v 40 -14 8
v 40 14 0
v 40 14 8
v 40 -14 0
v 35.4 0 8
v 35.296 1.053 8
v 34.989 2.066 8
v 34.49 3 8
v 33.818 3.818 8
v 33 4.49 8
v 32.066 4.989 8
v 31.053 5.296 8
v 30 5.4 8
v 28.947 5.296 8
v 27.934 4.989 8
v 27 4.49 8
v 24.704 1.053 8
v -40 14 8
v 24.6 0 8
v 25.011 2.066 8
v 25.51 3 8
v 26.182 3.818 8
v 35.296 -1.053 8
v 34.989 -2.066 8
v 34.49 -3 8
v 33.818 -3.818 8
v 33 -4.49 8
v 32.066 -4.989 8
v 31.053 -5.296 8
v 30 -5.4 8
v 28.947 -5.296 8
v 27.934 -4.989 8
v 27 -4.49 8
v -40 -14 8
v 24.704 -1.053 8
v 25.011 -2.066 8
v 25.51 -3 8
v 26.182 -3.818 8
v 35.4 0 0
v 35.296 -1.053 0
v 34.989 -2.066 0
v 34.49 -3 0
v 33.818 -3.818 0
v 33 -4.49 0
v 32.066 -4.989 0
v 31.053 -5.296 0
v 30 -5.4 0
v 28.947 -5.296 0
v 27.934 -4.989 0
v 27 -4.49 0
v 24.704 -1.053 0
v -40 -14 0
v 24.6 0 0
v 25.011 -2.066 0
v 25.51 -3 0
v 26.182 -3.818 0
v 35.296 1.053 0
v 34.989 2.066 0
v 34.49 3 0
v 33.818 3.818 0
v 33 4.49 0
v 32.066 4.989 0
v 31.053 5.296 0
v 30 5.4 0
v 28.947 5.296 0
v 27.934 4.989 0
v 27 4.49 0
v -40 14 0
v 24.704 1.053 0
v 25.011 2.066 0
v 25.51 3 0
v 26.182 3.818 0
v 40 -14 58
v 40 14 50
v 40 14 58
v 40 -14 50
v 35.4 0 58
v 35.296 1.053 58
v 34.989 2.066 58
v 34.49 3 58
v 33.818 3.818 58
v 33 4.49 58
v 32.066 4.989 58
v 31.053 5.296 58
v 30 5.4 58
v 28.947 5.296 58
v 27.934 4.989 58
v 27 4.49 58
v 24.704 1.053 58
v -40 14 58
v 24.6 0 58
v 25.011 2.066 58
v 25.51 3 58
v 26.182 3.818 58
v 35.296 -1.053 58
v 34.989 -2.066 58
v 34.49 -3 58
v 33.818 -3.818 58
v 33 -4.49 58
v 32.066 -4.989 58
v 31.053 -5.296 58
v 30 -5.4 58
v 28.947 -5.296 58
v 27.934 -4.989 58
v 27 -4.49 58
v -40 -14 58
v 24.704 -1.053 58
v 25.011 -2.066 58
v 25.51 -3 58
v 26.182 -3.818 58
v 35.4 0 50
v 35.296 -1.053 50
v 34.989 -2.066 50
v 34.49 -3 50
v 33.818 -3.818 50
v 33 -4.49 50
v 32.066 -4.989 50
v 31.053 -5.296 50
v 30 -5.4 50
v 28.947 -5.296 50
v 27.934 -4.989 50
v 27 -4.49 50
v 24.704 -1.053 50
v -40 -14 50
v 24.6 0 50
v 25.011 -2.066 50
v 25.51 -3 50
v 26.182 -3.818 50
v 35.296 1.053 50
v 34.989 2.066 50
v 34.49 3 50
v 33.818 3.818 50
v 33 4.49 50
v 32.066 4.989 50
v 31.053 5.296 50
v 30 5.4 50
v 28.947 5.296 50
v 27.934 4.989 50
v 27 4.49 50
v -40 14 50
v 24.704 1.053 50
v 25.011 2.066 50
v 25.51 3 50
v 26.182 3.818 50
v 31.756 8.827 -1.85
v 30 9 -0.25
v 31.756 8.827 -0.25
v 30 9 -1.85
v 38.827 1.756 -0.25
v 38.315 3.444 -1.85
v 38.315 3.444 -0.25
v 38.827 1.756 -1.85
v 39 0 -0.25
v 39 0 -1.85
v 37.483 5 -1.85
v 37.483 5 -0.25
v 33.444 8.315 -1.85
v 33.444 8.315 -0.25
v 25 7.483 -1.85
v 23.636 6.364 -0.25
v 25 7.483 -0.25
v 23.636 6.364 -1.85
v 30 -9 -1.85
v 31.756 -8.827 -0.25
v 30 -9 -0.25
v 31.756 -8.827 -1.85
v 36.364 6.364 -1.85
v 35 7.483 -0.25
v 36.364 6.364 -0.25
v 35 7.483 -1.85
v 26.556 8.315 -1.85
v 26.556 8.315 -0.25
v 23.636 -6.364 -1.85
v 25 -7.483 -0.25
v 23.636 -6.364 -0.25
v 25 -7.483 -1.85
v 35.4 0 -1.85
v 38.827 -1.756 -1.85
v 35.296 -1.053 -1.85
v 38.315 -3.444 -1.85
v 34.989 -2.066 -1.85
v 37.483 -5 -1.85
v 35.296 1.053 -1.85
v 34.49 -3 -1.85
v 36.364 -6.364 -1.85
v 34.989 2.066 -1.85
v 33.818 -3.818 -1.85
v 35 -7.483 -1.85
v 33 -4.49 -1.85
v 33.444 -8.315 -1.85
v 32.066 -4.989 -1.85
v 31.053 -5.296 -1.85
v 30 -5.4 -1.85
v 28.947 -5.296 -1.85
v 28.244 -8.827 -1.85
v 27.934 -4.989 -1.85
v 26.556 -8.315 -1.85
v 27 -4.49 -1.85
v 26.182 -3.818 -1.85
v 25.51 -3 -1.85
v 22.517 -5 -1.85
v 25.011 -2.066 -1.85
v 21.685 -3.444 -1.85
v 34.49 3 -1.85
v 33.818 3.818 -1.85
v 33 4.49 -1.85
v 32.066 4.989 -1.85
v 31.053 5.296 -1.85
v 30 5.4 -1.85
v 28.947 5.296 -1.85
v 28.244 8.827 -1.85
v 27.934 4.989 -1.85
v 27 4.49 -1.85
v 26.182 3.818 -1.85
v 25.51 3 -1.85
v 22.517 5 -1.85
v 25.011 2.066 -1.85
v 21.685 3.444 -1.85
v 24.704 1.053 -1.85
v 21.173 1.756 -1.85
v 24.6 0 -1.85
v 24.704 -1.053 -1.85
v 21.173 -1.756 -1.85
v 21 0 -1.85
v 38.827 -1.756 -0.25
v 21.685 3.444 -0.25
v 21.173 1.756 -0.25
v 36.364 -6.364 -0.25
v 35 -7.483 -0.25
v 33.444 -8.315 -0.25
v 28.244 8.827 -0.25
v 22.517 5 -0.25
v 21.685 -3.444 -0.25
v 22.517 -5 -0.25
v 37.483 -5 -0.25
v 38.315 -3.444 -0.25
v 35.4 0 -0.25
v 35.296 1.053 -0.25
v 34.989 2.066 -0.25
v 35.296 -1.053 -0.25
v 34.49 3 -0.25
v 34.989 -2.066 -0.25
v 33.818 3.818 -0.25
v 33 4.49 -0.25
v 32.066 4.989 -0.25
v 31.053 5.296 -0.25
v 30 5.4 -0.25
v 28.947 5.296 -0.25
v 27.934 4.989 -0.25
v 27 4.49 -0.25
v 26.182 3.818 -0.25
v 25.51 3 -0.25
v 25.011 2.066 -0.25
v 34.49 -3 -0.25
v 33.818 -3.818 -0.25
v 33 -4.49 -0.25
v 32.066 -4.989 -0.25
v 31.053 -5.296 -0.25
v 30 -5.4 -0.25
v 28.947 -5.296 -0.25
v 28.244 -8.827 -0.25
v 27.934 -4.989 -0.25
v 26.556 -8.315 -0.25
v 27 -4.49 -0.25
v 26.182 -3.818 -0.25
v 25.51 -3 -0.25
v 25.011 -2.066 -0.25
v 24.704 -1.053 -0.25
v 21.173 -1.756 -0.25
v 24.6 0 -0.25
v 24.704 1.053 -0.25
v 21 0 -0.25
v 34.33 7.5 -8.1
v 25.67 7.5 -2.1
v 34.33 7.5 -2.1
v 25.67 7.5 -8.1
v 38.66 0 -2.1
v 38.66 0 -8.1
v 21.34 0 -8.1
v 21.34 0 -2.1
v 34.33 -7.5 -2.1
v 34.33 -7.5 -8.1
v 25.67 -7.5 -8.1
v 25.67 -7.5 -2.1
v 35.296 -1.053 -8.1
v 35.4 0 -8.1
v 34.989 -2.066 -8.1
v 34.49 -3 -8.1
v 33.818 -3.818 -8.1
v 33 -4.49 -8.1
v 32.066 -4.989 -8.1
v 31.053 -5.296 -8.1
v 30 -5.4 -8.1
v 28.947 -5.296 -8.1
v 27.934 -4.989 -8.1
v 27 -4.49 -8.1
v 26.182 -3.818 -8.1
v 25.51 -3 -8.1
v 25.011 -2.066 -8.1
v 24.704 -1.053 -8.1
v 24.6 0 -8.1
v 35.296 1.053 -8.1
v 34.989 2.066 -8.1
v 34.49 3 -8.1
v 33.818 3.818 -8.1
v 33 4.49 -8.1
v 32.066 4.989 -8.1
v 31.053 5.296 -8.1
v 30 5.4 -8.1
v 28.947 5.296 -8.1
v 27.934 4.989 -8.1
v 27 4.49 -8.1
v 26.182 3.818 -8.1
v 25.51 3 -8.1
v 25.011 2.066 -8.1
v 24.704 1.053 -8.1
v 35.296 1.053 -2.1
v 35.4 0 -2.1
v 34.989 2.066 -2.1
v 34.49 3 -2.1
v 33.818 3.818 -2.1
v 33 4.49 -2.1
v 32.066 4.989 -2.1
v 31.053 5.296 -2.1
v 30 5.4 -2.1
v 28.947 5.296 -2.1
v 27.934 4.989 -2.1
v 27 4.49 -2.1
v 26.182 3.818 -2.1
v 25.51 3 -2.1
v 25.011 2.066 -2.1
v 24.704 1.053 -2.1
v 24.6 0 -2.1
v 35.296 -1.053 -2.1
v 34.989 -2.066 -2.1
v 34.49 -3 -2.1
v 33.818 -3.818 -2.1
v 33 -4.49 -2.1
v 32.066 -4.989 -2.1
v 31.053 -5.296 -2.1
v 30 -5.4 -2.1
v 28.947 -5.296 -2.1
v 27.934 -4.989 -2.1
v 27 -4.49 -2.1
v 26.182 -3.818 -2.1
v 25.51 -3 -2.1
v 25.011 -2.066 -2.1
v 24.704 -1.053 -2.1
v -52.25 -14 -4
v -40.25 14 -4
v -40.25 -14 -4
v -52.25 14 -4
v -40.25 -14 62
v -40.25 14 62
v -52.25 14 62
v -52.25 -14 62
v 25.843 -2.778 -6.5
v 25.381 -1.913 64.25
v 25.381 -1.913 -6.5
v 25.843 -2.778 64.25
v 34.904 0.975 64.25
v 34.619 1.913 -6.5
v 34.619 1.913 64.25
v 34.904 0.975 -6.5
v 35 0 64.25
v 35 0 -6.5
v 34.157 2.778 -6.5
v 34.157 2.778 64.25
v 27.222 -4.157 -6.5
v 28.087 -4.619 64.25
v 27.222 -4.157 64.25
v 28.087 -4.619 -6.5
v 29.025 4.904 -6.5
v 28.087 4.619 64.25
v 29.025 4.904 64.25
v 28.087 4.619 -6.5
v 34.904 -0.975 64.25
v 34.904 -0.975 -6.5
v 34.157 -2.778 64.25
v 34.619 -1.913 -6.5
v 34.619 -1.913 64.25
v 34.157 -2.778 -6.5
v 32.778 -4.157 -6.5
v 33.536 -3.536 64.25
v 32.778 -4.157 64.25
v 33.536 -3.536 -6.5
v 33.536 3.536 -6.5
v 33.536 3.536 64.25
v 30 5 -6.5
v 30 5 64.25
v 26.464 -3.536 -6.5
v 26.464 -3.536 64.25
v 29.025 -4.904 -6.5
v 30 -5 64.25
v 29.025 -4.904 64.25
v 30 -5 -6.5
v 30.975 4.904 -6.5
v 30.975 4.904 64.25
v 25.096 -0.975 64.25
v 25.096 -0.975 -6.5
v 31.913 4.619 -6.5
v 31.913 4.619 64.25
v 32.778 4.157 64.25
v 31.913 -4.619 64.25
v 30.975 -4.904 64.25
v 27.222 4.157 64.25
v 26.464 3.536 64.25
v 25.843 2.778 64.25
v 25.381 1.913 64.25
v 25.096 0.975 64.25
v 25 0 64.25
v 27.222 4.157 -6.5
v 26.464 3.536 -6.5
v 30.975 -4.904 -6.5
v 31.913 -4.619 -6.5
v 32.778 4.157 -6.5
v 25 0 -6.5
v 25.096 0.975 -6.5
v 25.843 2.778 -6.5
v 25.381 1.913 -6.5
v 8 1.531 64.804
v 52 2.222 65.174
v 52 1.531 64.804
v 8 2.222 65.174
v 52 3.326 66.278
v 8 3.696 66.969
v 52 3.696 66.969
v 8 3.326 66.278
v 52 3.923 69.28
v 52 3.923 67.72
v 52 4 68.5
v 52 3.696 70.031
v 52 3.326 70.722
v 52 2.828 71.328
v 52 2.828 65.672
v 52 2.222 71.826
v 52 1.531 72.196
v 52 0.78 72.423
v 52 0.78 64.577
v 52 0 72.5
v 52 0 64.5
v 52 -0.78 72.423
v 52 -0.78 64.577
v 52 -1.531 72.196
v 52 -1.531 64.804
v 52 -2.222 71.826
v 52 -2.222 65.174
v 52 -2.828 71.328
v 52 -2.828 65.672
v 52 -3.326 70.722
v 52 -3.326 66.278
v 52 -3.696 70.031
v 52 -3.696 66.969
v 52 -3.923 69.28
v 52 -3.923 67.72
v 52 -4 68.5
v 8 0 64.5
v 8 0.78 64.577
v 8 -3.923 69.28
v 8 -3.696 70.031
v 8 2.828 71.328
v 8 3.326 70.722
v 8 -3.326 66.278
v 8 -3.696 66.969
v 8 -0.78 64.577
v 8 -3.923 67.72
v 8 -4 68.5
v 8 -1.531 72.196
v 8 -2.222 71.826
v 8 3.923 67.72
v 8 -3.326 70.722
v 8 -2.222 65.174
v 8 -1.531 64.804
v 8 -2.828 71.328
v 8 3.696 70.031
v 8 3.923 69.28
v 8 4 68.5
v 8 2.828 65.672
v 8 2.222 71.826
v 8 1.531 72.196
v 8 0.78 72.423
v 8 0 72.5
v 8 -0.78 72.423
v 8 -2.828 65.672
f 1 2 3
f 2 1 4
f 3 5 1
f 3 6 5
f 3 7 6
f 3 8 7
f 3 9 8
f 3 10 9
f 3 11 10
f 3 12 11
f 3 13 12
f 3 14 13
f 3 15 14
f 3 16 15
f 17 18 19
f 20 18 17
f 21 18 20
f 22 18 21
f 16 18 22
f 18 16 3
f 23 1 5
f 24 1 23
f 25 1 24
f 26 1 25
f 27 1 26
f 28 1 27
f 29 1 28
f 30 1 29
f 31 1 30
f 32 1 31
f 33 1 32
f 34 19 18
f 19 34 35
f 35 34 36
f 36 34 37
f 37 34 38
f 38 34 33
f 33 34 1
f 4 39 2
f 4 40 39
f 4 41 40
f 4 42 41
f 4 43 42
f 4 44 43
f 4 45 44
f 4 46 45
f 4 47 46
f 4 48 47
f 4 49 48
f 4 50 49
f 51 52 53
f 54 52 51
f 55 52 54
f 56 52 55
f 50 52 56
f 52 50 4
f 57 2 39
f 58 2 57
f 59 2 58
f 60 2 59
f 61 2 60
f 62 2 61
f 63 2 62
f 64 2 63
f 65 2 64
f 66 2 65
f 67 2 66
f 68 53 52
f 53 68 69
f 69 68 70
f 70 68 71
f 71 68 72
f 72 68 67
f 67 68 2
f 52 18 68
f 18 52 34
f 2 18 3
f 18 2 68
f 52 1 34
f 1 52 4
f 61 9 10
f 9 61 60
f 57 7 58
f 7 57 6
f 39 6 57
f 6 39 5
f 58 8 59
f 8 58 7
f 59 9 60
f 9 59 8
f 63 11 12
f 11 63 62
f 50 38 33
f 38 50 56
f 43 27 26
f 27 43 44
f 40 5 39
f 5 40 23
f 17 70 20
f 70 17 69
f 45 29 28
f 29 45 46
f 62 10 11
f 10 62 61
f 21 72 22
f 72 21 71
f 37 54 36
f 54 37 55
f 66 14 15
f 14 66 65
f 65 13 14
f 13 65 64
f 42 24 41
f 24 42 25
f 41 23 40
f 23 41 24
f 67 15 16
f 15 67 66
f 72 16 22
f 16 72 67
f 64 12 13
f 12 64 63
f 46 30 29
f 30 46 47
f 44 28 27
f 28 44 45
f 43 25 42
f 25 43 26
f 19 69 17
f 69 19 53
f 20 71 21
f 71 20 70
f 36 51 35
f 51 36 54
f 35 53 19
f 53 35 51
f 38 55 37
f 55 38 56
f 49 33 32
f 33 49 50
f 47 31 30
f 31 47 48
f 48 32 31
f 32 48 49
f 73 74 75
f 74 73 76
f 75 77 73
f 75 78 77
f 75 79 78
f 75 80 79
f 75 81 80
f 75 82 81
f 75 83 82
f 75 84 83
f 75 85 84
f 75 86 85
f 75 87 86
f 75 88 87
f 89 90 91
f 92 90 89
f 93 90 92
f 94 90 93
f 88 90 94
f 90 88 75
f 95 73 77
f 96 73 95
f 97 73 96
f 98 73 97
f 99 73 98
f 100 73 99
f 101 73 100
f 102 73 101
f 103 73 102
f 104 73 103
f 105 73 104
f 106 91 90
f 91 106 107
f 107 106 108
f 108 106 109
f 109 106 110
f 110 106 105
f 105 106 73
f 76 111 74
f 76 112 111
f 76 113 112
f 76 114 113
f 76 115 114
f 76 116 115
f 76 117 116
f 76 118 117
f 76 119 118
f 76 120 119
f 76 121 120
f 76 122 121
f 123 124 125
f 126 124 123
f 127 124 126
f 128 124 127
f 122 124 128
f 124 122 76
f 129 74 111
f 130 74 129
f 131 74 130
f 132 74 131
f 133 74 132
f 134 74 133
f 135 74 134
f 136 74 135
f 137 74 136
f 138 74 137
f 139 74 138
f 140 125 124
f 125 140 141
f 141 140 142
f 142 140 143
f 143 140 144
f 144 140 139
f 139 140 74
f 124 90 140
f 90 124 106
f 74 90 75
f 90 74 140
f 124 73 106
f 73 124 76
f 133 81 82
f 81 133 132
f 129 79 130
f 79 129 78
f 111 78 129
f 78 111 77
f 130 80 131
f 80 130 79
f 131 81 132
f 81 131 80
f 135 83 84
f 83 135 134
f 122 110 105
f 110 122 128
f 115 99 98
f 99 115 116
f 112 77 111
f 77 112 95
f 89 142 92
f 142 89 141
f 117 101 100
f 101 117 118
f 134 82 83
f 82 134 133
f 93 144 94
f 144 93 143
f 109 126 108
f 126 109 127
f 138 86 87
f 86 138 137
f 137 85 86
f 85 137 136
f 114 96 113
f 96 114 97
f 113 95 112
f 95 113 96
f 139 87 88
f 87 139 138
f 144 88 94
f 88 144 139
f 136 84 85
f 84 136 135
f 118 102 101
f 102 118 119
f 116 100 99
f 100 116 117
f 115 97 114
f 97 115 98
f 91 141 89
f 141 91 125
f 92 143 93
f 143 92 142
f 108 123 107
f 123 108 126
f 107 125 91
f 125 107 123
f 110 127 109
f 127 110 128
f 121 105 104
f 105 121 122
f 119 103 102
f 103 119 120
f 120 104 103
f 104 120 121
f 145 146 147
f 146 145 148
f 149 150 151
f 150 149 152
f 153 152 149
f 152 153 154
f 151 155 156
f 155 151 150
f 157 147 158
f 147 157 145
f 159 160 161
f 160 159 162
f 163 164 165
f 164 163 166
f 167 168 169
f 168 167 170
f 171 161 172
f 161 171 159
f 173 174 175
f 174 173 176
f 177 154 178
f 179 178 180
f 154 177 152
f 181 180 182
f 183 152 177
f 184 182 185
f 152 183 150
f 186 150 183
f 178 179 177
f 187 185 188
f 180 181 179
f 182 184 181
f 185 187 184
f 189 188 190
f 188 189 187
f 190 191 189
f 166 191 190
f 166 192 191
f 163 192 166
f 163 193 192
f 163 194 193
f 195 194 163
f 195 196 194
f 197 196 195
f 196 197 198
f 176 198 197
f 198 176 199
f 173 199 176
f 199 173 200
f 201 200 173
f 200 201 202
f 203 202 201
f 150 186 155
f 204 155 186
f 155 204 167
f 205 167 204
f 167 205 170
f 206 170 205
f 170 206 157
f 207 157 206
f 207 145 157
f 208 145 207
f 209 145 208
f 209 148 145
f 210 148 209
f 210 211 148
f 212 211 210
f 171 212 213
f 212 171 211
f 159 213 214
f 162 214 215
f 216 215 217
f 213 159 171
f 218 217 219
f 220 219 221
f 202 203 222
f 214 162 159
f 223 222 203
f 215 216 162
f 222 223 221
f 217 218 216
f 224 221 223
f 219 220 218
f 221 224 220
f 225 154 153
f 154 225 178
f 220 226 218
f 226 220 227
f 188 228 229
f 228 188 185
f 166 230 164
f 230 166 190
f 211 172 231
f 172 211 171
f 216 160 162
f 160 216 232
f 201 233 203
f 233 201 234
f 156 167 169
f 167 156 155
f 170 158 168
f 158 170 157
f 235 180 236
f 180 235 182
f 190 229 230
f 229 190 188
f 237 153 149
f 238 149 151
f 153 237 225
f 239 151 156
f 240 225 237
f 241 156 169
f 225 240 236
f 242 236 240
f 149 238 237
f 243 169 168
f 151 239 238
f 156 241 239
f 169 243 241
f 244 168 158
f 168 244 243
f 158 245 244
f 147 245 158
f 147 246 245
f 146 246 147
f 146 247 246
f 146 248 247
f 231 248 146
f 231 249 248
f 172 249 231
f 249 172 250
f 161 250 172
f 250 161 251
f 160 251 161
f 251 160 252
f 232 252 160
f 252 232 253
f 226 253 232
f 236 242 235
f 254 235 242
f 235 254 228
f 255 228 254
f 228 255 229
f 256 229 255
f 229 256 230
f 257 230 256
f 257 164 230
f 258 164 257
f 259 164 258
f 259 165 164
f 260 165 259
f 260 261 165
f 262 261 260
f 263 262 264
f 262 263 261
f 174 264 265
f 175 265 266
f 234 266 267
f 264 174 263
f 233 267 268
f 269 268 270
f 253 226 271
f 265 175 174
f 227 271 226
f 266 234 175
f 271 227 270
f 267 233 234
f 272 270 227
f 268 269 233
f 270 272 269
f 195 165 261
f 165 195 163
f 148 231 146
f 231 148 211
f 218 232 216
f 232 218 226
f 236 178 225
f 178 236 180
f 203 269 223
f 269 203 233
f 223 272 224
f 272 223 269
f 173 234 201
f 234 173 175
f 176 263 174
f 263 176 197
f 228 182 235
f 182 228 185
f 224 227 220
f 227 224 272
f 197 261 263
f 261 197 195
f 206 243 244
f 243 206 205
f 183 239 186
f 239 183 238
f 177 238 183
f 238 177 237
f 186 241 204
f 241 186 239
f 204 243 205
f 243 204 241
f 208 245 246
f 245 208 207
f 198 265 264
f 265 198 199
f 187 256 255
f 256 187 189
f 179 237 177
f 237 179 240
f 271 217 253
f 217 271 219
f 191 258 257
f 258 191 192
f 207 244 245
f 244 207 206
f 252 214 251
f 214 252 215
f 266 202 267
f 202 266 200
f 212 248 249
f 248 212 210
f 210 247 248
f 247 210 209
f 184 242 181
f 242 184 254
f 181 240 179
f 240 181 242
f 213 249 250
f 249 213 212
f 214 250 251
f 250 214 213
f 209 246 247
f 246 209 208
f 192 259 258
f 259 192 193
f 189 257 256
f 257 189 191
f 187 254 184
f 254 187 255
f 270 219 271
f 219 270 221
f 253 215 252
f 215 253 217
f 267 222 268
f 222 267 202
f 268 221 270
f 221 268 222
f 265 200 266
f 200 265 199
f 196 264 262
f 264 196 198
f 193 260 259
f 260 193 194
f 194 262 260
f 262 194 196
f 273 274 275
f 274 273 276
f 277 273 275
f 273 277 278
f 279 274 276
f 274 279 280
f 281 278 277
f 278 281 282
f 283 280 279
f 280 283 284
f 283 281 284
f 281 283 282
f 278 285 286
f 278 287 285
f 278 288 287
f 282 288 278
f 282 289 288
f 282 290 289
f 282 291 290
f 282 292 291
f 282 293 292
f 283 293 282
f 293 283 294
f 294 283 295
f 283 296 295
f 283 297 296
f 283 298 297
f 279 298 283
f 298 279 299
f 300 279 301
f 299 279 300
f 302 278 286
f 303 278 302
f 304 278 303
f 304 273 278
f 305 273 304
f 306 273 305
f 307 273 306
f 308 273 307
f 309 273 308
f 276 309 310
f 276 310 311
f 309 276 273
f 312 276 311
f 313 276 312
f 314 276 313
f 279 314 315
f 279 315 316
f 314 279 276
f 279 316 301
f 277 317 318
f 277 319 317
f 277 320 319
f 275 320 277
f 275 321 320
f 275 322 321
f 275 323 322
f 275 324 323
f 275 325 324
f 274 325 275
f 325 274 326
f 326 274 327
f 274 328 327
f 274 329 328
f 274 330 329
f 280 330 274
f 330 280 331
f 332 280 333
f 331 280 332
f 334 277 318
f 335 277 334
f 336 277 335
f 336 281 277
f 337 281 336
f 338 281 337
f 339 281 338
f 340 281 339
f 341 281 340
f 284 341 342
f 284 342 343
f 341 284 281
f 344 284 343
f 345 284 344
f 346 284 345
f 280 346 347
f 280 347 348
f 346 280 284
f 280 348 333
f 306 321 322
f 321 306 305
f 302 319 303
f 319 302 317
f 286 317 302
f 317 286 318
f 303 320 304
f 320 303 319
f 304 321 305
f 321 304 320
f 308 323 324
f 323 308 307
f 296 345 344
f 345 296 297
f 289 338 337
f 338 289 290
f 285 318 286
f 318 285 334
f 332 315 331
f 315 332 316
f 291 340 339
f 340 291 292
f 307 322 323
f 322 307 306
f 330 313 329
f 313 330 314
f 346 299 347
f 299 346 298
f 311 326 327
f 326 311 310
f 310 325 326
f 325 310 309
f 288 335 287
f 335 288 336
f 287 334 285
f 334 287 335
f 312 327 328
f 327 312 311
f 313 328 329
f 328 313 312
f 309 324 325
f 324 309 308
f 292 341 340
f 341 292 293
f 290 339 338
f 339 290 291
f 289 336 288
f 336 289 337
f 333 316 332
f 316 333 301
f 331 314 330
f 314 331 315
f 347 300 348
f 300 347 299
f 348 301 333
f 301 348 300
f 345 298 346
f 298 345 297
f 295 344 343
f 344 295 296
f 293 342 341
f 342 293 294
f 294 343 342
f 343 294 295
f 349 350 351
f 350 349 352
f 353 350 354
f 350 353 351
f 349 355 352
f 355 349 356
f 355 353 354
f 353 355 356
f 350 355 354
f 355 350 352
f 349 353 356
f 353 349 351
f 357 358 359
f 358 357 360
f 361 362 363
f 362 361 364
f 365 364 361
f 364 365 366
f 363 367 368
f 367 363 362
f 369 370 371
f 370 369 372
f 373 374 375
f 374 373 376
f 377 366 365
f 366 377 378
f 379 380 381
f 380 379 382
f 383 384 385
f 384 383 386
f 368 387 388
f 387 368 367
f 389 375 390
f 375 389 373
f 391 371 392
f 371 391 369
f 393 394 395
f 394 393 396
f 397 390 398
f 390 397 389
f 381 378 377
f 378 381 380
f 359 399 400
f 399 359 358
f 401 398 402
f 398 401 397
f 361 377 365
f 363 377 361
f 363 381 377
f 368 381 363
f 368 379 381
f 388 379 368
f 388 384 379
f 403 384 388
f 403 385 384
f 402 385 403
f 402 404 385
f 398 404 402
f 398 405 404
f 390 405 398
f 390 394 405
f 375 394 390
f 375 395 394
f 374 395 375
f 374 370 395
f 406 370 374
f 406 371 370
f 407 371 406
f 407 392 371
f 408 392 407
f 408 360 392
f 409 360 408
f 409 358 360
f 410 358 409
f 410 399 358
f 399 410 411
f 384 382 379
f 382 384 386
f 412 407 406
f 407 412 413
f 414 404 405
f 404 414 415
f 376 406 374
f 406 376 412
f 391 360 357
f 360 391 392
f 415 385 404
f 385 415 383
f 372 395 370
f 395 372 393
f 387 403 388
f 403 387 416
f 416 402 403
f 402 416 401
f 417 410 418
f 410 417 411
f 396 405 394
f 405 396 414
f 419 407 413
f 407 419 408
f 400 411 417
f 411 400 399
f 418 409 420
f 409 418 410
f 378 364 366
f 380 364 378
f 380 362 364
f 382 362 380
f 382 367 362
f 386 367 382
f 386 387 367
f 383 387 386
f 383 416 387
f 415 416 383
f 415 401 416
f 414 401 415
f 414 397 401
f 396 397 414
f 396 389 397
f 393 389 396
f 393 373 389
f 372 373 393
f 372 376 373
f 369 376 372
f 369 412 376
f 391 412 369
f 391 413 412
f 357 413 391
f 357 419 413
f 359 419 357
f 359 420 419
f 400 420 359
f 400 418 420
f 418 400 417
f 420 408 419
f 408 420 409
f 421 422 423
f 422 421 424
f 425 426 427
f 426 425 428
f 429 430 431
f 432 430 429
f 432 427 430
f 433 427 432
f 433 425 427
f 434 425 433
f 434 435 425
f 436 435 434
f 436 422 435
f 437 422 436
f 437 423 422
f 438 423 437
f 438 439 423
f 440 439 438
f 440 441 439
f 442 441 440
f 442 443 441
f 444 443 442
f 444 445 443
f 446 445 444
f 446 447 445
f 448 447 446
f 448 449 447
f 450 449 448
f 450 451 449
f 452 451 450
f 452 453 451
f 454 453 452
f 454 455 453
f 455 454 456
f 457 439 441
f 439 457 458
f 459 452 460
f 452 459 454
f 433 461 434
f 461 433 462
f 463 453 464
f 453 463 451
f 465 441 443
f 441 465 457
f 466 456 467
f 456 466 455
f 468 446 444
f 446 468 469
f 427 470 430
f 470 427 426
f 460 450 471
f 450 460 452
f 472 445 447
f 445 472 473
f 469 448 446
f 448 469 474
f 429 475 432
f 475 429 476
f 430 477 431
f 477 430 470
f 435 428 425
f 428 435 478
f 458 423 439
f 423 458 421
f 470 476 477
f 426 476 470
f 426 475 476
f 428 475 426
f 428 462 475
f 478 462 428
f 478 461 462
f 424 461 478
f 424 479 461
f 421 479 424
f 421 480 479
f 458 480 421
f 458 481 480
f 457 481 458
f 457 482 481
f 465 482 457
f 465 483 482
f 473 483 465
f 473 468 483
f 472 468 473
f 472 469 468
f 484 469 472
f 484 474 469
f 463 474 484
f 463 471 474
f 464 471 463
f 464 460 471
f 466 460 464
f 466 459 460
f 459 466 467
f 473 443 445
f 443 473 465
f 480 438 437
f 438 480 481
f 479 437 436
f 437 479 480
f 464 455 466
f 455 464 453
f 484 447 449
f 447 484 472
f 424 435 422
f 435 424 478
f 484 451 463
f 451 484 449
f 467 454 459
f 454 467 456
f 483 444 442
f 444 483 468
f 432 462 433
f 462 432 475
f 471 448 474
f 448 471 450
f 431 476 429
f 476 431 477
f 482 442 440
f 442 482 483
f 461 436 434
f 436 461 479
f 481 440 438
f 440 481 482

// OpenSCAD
$fn = 32;

// ------------------------------------------------------------------------
// C clamp: throat 50 mm, screw d10
// Every part is its own module, assembly() places every instance.
// ------------------------------------------------------------------------

// --- part 1 ---
module clamp_arm() {
  difference() {
    translate([-40, -14, 0]) cube([80, 28, 8]);
    translate([30, 0, -1]) cylinder(h = 10, d = 10.8);
  }
}

// --- part 2 ---
module clamp_spine() {
  difference() {
    translate([-33, -14, 0]) cube([66, 28, 12]);
  }
}

// --- part 3 ---
module clamp_screw() {
  translate([0, 0, -35.375]) cylinder(h = 70.75, d = 10);
}

// --- part 4 ---
module clamp_washer() {
  difference() {
      translate([0, 0, 0]) cylinder(h = 1.6, d = 18);
      translate([0, 0, -1]) cylinder(h = 3.6, d = 10.8);
    }
}

// --- part 5 ---
module clamp_nut() {
  difference() {
    linear_extrude(height = 6) polygon(points = [[8.66, 0], [4.33, 7.5], [-4.33, 7.5], [-8.66, 0], [-4.33, -7.5], [4.33, -7.5]]);
    translate([0, 0, -1]) cylinder(h = 8, d = 10.8);
  }
}

// --- part 6 ---
module tommy_bar() {
  translate([0, 0, -22]) cylinder(h = 44, d = 8);
}

// --- assembly ---
module assembly() {
  color([0.80, 0.24, 0.20]) translate([0, 0, 0]) rotate([0, 0, 0]) clamp_arm();
  color([0.20, 0.45, 0.75]) translate([0, 0, 50]) rotate([0, 0, 0]) clamp_arm();
  color([0.25, 0.62, 0.32]) translate([-52.25, 0, 29]) rotate([0, 90, 0]) clamp_spine();
  color([0.92, 0.70, 0.18]) translate([30, 0, 28.875]) rotate([0, 0, 0]) clamp_screw();
  color([0.58, 0.35, 0.70]) translate([30, 0, -1.85]) rotate([0, 0, 0]) clamp_washer();
  color([0.16, 0.66, 0.66]) translate([30, 0, -8.1]) rotate([0, 0, 0]) clamp_nut();
  color([0.85, 0.48, 0.18]) translate([30, 0, 68.5]) rotate([0, 90, 0]) tommy_bar();
}

assembly();
